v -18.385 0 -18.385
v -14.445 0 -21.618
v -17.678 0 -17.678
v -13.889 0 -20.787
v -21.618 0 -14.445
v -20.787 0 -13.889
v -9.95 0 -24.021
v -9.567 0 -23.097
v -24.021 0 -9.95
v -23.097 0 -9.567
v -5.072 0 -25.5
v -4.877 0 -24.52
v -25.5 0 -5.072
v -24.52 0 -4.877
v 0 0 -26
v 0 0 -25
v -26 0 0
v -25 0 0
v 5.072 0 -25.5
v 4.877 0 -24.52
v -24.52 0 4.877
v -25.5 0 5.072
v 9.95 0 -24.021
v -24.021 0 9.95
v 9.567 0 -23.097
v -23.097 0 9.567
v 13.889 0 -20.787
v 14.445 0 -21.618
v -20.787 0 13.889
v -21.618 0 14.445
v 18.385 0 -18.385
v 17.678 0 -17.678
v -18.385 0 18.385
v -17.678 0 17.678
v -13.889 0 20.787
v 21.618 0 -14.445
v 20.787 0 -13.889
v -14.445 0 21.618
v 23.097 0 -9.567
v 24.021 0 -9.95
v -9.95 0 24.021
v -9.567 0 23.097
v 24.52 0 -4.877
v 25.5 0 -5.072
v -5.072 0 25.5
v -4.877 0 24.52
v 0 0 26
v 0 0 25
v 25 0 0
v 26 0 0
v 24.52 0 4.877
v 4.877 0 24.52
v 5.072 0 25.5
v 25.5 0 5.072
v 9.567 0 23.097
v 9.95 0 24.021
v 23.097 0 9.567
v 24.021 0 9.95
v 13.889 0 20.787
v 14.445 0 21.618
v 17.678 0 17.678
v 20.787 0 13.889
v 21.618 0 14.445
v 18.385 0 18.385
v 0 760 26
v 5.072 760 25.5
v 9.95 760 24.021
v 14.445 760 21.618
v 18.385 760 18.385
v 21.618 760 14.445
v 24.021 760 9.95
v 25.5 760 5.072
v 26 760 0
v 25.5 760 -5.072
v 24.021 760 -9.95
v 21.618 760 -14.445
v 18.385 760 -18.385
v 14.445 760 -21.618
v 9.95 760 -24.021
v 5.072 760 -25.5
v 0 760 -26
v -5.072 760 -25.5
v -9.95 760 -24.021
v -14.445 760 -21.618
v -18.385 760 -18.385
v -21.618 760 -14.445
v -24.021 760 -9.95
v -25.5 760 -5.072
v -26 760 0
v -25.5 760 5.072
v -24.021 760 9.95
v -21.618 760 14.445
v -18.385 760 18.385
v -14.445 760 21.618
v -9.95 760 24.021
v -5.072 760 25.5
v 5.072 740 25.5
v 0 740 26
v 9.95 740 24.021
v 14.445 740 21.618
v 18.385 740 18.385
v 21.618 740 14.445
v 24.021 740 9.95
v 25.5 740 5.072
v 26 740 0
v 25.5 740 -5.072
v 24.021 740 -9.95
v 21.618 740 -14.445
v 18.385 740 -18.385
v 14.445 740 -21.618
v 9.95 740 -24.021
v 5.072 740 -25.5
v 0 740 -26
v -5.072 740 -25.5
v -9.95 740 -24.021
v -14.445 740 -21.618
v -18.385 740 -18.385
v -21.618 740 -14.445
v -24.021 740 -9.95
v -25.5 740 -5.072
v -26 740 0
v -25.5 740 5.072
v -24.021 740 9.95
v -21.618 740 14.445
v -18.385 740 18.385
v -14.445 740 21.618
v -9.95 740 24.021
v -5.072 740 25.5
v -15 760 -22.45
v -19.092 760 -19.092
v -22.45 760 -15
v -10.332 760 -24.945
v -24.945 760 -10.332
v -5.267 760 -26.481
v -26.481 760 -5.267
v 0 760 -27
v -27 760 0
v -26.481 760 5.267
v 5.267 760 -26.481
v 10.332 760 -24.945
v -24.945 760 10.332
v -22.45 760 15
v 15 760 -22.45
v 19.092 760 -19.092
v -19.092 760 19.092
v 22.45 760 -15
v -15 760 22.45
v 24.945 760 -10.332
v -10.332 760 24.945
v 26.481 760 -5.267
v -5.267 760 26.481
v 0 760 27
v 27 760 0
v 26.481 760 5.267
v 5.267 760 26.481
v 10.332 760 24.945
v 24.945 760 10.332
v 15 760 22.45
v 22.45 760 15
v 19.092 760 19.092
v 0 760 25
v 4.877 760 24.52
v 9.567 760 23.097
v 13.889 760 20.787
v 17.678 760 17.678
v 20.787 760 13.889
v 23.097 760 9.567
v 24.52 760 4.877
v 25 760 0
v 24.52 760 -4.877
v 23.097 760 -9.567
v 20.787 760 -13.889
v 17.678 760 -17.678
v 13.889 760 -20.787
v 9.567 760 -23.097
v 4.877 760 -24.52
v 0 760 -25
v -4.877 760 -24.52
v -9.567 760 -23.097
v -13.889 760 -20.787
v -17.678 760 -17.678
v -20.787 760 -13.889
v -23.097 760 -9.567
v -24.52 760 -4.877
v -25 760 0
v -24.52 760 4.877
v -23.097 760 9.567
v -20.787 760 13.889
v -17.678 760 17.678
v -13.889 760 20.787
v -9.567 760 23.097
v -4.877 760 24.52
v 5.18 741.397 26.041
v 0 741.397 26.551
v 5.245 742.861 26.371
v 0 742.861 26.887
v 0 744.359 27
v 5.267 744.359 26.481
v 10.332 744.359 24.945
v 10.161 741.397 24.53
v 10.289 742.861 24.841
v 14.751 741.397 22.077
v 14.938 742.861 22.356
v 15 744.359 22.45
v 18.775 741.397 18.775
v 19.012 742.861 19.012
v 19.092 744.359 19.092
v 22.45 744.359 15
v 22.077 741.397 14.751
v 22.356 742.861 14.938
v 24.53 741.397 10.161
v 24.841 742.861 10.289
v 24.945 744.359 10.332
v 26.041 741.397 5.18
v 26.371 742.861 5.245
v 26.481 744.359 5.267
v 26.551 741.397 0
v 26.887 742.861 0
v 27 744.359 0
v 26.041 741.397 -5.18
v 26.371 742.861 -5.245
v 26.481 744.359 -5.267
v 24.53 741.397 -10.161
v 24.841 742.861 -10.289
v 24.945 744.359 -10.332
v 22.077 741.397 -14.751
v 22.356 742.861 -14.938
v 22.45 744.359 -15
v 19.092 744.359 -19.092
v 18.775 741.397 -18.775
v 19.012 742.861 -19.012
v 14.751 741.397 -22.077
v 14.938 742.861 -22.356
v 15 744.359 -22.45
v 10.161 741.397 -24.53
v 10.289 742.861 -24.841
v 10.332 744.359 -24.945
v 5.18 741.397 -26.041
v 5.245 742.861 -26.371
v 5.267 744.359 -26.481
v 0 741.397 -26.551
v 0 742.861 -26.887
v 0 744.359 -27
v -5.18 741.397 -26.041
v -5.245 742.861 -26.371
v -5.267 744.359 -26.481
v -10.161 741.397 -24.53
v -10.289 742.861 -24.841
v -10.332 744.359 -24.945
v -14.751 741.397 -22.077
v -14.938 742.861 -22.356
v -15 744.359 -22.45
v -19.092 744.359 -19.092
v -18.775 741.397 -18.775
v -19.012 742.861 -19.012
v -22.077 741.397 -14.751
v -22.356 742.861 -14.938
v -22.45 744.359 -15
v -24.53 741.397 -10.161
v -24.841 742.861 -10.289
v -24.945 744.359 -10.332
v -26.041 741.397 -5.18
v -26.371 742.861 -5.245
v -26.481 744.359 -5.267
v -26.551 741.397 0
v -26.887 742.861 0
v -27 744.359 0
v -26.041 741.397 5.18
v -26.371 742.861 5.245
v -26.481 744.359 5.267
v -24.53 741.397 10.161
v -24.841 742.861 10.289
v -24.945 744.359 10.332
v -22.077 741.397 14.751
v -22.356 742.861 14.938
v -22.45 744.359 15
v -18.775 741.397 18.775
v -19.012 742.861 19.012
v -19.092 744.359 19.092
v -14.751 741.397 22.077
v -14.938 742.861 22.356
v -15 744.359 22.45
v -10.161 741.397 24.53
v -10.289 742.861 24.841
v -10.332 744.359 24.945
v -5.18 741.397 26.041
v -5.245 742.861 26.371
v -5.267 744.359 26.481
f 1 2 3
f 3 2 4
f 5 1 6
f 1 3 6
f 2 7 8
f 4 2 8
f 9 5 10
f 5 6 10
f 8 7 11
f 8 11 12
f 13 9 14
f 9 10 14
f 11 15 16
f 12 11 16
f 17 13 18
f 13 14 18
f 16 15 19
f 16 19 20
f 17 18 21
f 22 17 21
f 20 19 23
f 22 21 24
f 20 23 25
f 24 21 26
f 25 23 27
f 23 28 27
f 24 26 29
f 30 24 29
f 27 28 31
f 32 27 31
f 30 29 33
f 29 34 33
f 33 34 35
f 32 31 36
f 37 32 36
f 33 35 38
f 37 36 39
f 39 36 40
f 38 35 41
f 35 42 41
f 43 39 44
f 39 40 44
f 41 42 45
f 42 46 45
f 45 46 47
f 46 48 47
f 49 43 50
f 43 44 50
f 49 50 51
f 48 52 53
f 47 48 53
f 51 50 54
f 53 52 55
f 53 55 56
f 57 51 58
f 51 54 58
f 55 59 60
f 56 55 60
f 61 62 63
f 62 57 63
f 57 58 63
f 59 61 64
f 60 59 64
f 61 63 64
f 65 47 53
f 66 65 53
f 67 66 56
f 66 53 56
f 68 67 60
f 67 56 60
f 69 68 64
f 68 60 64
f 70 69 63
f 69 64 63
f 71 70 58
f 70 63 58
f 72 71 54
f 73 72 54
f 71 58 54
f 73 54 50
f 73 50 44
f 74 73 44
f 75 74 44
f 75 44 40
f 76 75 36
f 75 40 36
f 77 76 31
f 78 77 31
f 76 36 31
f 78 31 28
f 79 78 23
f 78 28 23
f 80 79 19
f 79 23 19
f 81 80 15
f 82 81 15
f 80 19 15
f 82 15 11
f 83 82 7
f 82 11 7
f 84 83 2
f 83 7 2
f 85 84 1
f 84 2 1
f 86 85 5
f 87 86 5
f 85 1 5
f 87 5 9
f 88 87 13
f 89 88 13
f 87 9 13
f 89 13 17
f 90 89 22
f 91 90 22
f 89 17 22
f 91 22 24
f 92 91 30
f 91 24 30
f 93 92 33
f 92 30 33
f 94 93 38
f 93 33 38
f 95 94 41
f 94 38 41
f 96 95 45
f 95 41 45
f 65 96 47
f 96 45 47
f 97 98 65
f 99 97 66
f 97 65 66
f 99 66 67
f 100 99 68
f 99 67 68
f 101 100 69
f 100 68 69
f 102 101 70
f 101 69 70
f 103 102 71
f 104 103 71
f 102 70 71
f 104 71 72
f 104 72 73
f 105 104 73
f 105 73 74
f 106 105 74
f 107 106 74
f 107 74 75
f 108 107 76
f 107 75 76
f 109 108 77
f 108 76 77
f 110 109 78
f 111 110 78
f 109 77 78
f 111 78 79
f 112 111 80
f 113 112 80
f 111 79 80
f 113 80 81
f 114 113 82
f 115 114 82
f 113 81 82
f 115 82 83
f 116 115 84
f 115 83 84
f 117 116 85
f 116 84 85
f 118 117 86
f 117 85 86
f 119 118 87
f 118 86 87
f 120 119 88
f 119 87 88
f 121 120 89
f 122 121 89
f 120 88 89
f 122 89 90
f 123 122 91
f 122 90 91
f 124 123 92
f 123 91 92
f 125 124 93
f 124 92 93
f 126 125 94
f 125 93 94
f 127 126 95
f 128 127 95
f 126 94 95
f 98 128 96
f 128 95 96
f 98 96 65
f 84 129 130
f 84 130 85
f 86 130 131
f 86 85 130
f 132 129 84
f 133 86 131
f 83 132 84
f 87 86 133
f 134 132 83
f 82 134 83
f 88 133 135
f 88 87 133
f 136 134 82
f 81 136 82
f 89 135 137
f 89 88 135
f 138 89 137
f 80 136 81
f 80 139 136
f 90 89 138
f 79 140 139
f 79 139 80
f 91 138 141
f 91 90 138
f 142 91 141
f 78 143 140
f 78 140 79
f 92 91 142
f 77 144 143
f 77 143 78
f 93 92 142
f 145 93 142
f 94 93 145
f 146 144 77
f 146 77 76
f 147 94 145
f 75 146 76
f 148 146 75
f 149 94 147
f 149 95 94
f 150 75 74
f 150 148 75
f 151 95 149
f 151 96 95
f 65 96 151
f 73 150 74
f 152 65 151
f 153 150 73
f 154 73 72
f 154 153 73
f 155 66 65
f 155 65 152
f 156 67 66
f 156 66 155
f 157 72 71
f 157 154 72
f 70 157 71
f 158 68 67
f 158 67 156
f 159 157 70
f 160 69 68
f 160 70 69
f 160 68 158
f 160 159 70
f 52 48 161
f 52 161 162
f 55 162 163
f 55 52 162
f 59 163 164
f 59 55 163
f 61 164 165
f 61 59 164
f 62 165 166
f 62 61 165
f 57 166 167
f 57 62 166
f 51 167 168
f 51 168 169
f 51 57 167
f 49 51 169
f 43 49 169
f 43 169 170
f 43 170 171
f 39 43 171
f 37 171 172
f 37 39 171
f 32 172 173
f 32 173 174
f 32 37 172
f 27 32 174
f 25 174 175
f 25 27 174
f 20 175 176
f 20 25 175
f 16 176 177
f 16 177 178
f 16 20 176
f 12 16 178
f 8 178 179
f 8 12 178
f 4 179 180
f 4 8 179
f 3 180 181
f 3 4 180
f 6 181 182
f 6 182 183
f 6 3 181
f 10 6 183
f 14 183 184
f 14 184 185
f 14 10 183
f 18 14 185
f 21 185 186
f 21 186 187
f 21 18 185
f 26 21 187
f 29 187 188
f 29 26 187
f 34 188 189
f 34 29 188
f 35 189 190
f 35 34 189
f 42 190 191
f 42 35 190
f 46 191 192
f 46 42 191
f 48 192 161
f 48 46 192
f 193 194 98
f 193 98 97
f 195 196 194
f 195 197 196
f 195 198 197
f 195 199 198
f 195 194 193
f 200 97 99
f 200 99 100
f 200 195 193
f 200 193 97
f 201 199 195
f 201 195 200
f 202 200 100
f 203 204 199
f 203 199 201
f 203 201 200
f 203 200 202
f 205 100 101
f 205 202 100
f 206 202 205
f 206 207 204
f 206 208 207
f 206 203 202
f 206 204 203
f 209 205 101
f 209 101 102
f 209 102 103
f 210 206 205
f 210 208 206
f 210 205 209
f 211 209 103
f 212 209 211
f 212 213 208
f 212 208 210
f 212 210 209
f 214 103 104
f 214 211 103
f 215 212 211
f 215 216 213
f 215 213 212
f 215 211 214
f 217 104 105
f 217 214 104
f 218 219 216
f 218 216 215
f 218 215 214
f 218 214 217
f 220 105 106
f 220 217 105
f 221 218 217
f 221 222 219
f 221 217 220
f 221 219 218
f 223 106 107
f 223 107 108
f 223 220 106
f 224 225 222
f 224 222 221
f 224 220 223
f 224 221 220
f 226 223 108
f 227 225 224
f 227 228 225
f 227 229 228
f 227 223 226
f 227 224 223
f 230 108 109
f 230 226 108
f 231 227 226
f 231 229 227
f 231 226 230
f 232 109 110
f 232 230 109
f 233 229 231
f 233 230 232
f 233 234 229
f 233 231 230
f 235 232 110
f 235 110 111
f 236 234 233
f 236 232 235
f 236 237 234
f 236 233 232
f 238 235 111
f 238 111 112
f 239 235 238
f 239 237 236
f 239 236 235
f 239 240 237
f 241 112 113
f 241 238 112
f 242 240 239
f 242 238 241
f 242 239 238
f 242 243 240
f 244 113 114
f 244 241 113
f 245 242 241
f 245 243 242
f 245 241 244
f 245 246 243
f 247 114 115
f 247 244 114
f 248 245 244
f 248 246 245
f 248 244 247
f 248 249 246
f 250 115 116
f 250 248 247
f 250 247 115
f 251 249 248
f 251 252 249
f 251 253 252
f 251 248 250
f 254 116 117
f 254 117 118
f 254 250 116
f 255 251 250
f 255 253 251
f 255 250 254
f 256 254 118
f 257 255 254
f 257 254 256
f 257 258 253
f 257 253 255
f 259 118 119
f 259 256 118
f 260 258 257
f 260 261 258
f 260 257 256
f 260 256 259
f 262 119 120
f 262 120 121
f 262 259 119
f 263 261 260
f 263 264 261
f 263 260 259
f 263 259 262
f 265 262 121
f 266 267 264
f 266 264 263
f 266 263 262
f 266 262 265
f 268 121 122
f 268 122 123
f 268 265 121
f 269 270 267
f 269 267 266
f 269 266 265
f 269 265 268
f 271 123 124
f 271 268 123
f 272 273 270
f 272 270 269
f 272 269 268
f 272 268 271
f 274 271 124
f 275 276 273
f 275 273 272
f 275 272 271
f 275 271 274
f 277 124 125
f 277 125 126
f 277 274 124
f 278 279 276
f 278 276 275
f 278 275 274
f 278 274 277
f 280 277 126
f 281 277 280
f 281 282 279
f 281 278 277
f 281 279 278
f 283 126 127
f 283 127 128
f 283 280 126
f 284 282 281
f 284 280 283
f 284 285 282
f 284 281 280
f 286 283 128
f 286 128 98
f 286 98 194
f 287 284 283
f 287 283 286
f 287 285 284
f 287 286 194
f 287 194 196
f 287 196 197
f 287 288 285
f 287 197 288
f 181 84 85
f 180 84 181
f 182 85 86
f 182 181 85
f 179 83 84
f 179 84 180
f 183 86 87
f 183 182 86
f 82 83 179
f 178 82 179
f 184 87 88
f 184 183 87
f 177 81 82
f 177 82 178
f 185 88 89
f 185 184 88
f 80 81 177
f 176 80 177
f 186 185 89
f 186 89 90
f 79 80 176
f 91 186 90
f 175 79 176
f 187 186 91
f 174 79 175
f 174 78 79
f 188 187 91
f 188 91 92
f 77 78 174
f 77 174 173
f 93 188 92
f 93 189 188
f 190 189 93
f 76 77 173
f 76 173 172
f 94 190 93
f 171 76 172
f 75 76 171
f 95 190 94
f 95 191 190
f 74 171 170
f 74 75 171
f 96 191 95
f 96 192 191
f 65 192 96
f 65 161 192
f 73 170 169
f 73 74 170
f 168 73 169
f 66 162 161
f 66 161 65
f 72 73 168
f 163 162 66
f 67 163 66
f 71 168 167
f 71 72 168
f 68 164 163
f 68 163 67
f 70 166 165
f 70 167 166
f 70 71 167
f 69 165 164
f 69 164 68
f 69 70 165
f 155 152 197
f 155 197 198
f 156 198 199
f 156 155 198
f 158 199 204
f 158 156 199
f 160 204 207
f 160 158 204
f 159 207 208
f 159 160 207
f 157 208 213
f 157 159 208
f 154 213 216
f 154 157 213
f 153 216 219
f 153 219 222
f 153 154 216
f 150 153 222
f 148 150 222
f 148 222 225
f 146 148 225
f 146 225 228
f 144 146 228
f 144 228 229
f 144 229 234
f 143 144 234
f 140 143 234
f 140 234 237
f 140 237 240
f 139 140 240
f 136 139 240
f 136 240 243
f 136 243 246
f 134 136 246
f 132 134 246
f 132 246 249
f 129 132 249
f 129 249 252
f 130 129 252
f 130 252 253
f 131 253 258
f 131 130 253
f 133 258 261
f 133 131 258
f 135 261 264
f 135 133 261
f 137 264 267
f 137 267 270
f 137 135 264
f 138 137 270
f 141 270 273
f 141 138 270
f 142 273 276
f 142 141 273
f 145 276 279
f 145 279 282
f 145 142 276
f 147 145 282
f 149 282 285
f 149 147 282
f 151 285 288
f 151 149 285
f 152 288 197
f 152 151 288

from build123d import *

# Parameters (mm, degrees)
ESBO_O1_R                = 26
ESBO_O1_R_2              = 25
RESSALTO_EXTRUS_O1_DEPTH = 760
ESBO_O2_R                = 27
ESBO_O2_R_2              = 26
RESSALTO_EXTRUS_O2_DEPTH = 20
FILETE2_R                = 10


with BuildPart() as part:
    # Esboço1 → Ressalto-extrusão1 (new body)
    with BuildSketch(Plane(origin=(0, 0, 0), x_dir=(1, 0, 0), z_dir=(0, 1, 0))):
        with Locations(Location((0, 0, 0), (0, 0, 270))):
            Circle(ESBO_O1_R)
        with Locations(Location((0, 0, 0), (0, 0, 270))):
            Circle(ESBO_O1_R_2, mode=Mode.SUBTRACT)
    extrude(amount=RESSALTO_EXTRUS_O1_DEPTH)


with BuildPart() as body_2:
    # Esboço2 → Ressalto-extrusão2 (new body)
    with BuildSketch(Plane(origin=(0, 760, 0), x_dir=(1, 0, 0), z_dir=(0, 1, 0))):
        with Locations(Location((0, 0, 0), (0, 0, 270))):
            Circle(ESBO_O2_R)
        with Locations(Location((0, 0, 0), (0, 0, 270))):
            Circle(ESBO_O2_R_2, mode=Mode.SUBTRACT)
    extrude(amount=-RESSALTO_EXTRUS_O2_DEPTH)

    # Filete2
    # the kernel refuses this fillet: 10 mm, written as the material it takes off along each edge
    with BuildSketch(Plane(origin=(0, 740, 0), x_dir=(0, 0, 1), z_dir=(-1, 0, 0))) as filete2_piece_1:
        with BuildLine():
            CenterArc((17, 4.358898944), FILETE2_R, 334.158067237, 25.841932763)
            Line((26, 0), (26.18, -0.087177979))
            ThreePointArc((26.18, -0.087177979), (26.5, -0.2), (27, -0.2))
            Line((27, -0.2), (27.2, 0))
            Line((27.2, 0), (27.2, 4.358898944))
            Line((27.2, 4.358898944), (27, 4.358898944))
        make_face()
    revolve(axis=Axis((0, 740, 0), (0, 1, 0)), mode=Mode.SUBTRACT)


solid = Compound([part.part, body_2.part])
